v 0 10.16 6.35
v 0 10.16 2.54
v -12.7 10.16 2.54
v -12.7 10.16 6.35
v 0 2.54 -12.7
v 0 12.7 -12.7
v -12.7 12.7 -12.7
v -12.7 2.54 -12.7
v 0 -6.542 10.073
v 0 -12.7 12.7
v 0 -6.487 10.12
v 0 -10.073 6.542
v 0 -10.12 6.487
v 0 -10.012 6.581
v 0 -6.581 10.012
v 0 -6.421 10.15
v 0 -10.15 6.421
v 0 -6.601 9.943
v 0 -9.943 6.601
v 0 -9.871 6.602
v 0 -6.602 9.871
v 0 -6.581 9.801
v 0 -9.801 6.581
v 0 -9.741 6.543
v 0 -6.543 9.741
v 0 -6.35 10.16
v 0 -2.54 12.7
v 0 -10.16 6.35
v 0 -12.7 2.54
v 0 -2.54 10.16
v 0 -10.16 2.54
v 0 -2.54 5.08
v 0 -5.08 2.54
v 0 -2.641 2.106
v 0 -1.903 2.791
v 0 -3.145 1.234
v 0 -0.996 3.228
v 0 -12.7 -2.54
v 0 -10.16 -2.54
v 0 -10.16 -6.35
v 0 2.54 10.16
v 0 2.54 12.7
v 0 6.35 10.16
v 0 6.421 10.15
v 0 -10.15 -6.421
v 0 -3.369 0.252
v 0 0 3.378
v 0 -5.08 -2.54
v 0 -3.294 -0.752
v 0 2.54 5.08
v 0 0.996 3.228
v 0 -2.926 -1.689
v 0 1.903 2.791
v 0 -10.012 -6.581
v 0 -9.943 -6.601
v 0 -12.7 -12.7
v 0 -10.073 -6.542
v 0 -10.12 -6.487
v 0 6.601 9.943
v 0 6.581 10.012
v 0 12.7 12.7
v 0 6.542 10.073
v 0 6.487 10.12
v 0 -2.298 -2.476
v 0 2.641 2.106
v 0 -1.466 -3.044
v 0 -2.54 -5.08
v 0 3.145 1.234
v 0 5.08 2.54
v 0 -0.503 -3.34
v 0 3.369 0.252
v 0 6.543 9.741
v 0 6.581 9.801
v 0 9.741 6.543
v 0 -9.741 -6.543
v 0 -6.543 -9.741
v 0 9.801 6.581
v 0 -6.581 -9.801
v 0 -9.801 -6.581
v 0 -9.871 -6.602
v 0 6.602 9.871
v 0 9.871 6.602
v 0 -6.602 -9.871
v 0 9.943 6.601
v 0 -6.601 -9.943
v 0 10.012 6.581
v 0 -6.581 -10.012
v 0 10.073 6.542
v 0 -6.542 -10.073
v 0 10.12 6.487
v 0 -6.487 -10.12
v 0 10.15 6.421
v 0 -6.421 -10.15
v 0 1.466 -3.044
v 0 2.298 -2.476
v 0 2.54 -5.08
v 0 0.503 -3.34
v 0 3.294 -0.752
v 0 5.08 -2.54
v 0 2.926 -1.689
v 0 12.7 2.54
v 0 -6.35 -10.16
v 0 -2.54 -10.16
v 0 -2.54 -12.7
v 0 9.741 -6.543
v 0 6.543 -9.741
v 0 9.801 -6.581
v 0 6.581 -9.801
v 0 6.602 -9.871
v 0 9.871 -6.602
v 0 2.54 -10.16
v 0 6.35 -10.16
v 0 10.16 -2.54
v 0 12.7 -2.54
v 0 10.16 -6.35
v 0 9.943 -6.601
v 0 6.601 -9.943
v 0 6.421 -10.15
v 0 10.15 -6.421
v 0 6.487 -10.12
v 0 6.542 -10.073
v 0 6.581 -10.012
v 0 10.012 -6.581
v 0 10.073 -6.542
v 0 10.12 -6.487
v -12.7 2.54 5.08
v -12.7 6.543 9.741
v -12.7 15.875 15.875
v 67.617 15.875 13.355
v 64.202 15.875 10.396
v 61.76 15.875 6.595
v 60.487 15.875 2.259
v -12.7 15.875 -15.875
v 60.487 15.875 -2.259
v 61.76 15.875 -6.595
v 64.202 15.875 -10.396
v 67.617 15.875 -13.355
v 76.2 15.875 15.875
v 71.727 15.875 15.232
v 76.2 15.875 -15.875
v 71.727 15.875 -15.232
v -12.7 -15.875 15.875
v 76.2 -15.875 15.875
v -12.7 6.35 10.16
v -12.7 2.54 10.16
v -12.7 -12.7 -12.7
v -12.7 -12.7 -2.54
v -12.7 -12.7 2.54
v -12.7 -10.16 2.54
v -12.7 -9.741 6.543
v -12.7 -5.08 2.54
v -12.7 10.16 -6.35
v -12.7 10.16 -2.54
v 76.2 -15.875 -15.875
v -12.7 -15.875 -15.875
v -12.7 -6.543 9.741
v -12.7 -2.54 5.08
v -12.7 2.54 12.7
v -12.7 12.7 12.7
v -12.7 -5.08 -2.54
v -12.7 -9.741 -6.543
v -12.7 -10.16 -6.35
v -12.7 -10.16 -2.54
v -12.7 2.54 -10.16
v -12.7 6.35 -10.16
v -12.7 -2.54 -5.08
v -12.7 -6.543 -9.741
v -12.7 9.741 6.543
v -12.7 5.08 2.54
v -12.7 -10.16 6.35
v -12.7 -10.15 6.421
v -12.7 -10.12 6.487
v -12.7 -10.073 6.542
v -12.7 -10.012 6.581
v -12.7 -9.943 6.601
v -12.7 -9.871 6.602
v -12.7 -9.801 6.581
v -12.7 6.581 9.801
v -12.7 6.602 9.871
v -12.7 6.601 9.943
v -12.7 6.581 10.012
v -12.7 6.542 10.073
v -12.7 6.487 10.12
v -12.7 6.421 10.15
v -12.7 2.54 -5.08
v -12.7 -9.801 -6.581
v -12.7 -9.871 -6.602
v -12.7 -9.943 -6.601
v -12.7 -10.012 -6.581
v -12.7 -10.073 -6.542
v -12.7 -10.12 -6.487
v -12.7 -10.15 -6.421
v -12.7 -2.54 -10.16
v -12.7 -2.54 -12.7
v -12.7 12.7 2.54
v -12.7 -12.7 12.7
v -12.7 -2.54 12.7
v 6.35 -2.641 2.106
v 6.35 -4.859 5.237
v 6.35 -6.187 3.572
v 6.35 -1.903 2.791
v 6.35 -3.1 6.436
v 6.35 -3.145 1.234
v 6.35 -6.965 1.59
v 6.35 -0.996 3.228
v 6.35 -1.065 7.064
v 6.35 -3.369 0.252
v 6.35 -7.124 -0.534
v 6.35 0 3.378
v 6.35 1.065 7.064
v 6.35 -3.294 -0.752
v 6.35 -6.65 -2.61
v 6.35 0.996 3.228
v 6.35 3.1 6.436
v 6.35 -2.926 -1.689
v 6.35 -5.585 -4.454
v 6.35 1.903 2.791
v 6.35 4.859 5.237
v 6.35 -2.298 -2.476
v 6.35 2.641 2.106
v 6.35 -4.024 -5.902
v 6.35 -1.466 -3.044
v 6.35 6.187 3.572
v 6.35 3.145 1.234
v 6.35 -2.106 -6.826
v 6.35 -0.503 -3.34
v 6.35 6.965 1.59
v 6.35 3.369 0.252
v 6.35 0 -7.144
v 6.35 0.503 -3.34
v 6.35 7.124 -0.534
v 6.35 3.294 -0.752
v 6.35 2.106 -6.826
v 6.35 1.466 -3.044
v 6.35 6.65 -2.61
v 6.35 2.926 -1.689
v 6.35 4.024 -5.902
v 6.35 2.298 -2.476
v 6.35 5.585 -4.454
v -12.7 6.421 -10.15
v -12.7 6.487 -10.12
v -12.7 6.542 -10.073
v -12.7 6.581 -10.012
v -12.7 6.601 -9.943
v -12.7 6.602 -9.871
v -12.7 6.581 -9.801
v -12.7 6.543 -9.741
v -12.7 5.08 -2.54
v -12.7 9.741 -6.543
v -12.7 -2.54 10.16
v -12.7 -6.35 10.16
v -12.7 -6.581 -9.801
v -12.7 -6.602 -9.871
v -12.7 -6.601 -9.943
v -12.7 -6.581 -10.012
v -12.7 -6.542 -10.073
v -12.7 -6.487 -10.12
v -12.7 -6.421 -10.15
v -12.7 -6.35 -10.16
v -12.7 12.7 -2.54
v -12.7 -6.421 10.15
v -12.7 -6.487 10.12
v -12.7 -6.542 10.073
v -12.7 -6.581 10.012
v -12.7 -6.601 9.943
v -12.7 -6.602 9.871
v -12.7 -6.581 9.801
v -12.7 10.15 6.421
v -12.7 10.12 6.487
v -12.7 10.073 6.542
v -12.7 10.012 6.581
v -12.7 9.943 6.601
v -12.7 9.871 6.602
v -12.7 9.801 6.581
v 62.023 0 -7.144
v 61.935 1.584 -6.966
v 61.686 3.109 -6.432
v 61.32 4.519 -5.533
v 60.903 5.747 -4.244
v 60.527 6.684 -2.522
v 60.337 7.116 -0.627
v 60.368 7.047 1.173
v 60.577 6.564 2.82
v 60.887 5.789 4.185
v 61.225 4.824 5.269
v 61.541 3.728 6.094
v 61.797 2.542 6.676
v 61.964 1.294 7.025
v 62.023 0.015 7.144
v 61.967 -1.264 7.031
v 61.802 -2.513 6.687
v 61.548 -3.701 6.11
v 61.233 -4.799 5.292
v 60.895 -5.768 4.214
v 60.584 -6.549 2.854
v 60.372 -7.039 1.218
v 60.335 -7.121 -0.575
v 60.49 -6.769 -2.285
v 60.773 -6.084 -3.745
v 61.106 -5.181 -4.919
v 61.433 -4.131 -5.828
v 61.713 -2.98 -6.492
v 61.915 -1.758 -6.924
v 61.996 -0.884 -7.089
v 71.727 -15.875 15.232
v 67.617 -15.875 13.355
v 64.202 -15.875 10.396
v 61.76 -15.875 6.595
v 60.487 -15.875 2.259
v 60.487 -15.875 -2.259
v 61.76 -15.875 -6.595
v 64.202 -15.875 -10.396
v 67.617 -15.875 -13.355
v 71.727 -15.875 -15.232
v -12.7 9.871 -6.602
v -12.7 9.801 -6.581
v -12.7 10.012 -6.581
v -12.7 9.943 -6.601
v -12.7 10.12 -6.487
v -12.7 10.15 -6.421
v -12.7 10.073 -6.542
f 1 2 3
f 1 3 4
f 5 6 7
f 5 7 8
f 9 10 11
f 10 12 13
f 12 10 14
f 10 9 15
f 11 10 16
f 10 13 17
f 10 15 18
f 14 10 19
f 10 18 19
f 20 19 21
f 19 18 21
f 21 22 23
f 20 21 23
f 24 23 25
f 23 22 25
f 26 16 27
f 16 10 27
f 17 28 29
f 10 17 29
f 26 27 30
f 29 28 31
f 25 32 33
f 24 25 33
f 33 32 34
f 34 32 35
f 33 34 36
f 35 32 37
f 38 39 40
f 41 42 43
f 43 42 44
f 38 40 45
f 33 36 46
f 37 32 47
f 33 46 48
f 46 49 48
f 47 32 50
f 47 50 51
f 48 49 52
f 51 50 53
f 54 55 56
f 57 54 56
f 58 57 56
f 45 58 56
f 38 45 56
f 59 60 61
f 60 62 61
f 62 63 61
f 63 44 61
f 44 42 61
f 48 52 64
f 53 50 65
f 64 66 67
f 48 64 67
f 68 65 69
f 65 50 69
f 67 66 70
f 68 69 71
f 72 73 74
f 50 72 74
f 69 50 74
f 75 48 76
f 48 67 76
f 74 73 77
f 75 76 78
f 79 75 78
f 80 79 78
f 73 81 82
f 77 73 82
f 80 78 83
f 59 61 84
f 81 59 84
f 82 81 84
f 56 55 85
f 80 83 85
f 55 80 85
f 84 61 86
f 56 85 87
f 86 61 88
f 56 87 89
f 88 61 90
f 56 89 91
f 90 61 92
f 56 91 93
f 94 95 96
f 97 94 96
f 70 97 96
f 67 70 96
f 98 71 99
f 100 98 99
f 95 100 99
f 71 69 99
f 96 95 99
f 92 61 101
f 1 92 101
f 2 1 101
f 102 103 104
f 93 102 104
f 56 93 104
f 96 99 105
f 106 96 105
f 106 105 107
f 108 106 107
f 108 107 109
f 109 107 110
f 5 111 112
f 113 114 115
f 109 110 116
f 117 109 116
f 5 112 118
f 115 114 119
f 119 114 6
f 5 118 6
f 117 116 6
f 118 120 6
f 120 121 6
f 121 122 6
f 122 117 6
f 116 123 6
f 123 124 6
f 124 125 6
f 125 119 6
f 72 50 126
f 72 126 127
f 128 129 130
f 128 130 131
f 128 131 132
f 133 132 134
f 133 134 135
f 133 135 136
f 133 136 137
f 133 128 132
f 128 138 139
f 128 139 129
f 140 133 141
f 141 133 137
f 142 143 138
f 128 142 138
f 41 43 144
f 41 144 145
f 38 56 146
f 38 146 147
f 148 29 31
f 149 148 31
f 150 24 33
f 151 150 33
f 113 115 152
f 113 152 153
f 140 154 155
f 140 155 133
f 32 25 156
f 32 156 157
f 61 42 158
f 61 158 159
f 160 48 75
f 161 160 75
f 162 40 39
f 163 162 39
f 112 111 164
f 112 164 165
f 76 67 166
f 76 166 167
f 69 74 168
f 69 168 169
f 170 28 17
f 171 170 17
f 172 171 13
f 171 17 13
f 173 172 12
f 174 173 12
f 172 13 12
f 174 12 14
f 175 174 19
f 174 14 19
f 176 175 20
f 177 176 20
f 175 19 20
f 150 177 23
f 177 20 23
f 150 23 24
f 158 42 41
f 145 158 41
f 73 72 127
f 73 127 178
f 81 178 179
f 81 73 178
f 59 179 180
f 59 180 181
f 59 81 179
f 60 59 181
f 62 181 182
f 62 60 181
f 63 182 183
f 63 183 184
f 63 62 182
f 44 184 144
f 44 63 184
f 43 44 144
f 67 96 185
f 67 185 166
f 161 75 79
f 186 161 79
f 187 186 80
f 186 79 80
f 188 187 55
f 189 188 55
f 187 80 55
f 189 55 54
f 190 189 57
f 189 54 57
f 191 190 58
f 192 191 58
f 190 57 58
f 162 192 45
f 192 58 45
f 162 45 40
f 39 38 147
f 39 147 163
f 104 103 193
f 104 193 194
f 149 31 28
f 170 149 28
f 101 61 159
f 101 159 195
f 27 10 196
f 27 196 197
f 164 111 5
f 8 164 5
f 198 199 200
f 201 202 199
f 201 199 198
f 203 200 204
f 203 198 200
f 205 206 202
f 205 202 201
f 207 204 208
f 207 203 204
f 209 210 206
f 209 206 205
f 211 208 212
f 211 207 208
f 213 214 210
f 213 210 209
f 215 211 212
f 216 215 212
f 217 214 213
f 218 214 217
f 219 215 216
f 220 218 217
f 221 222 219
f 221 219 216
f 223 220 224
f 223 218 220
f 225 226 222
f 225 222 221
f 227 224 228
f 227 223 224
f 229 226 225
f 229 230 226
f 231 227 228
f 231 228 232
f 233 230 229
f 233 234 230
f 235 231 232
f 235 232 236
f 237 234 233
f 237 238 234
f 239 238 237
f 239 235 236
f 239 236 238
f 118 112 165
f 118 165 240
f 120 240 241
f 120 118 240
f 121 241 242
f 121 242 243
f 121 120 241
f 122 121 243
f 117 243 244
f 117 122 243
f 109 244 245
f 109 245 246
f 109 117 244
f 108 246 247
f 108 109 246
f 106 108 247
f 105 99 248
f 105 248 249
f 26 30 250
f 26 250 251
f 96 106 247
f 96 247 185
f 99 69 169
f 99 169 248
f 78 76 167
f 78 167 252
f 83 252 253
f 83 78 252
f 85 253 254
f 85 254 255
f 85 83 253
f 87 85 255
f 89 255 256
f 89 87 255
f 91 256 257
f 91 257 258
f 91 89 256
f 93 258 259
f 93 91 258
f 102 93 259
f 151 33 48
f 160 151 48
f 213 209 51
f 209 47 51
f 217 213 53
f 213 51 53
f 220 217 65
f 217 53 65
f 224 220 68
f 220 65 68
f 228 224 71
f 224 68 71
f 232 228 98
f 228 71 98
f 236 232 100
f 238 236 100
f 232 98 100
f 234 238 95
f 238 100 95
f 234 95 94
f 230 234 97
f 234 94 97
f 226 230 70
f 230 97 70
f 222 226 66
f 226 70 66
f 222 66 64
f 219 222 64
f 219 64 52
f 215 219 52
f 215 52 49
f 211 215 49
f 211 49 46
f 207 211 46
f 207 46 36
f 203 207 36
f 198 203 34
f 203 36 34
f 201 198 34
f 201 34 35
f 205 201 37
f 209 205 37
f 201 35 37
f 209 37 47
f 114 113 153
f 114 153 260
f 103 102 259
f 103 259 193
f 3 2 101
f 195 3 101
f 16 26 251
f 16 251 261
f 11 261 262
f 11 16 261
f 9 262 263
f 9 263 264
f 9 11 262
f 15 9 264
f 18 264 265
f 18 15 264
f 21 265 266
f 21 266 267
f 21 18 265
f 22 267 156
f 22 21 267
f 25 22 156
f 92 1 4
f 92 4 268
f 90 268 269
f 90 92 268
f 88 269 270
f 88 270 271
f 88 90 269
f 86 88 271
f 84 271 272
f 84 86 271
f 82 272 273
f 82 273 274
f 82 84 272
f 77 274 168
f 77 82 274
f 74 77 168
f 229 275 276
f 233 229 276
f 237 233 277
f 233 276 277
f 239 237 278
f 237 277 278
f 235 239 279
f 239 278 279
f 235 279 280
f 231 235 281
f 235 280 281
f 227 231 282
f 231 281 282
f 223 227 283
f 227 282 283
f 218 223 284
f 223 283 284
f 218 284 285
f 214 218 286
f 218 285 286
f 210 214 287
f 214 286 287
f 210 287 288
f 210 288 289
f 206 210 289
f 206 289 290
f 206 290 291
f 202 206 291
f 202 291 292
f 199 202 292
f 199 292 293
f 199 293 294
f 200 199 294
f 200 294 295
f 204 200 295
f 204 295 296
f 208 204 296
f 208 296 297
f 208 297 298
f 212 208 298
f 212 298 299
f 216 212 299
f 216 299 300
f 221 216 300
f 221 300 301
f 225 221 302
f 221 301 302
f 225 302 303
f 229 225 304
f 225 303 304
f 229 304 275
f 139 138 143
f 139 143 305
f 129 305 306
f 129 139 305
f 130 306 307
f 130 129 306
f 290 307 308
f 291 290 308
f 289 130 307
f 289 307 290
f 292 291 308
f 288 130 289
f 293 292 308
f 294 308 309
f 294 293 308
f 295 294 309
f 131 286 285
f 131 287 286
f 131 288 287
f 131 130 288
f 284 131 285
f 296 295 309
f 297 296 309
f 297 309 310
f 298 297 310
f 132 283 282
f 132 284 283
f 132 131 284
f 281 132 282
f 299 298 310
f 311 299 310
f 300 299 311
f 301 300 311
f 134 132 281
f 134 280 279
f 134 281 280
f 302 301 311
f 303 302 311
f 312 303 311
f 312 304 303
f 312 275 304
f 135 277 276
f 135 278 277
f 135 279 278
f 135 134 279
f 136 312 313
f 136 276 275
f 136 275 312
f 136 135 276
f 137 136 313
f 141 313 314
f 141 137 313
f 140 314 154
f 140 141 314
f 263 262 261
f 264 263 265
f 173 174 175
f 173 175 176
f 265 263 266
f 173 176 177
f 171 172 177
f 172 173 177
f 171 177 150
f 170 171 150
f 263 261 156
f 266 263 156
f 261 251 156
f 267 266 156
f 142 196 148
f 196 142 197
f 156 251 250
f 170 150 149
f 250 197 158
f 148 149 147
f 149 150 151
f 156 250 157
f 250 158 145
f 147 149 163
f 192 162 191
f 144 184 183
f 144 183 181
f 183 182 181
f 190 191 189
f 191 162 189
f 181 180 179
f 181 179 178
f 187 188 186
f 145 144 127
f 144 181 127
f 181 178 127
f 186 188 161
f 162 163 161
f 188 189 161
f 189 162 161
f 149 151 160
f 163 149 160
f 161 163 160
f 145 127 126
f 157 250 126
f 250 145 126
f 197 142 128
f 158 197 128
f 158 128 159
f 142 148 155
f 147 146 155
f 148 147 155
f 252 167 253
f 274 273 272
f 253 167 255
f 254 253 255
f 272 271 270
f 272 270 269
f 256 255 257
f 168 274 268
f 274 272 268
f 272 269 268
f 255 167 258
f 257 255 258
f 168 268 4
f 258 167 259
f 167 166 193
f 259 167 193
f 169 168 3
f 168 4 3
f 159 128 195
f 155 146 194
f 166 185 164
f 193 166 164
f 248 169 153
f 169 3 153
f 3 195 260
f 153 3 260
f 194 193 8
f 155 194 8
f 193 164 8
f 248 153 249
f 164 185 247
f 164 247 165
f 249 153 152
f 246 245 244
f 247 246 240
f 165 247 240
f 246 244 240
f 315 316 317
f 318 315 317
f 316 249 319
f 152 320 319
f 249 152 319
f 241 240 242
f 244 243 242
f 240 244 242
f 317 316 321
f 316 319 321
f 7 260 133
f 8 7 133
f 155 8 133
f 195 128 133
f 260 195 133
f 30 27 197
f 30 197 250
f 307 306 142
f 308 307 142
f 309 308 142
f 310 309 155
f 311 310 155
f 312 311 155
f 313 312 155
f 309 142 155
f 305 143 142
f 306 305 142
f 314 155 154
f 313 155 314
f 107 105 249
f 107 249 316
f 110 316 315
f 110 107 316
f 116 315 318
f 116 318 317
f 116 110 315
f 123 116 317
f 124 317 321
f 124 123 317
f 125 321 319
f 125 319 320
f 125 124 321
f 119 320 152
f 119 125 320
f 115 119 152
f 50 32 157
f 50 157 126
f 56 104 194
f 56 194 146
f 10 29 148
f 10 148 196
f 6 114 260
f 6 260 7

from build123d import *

# Parameters (mm, degrees)
SKETCH10_W                                           = 31.75
SKETCH10_H                                           = 31.75
SKETCH10_W_2                                         = 2.54
SKETCH10_H_2                                         = 5.08
SKETCH10_W_3                                         = 5.08
SKETCH10_H_3                                         = 2.54
BOSS_EXTRUDE3_DEPTH                                  = 12.7
SKETCH11_W                                           = 31.75
SKETCH11_H                                           = 31.75
BOSS_EXTRUDE4_DEPTH                                  = 76.2
CBORE_FOR_1_4_BINDING_HEAD_MACHINE_SCREW_D           = 6.7564
CBORE_FOR_1_4_BINDING_HEAD_MACHINE_SCREW_CBORE_D     = 14.2875
CBORE_FOR_1_4_BINDING_HEAD_MACHINE_SCREW_CBORE_DEPTH = 69.85
CUT_EXTRUDE1_DEPTH                                   = 31.75


with BuildPart() as part:
    # Sketch10 → Boss-Extrude3 (new body)
    # profile 1 of 9: a face of its own
    with BuildSketch(Plane(origin=(0, 0, 0), x_dir=(0, 0, -1), z_dir=(1, 0, 0))):
        Rectangle(SKETCH10_W, SKETCH10_H)
        Polygon((-2.54, 12.7), (2.54, 12.7), (12.7, 12.7), (12.7, 2.54), (12.7, -2.54), (12.7, -12.7), (2.54, -12.7), (-2.54, -12.7), (-12.7, -12.7), (-12.7, -2.54), (-12.7, 2.54), (-12.7, 12.7), align=None, mode=Mode.SUBTRACT)
    # profile 2 of 9: a face of its own
    with BuildSketch(Plane(origin=(0, 0, 0), x_dir=(0, 0, -1), z_dir=(1, 0, 0))):
        with Locations((11.43, 0)):
            Rectangle(SKETCH10_W_2, SKETCH10_H_2)
    # profile 3 of 9: a face of its own
    with BuildSketch(Plane(origin=(0, 0, 0), x_dir=(0, 0, -1), z_dir=(1, 0, 0))):
        with BuildLine():
            Line((10.16, -2.54), (10.16, 2.54))
            Line((10.16, 2.54), (10.16, 6.35))
            ThreePointArc((10.16, 6.35), (10.012022021, 6.580814495), (9.740509205, 6.542688341))
            Line((9.740509205, 6.542688341), (5.08, 2.54))
            Line((5.08, 2.54), (5.08, -2.54))
            Line((5.08, -2.54), (9.740509205, -6.542688341))
            ThreePointArc((9.740509205, -6.542688341), (10.012022021, -6.580814495), (10.16, -6.35))
            Line((10.16, -6.35), (10.16, -2.54))
        make_face()
    # profile 4 of 9: a face of its own
    with BuildSketch(Plane(origin=(0, 0, 0), x_dir=(0, 0, -1), z_dir=(1, 0, 0))):
        with Locations((0, -11.43)):
            Rectangle(SKETCH10_W_3, SKETCH10_H_3)
    # profile 5 of 9: a face of its own
    with BuildSketch(Plane(origin=(0, 0, 0), x_dir=(0, 0, -1), z_dir=(1, 0, 0))):
        with BuildLine():
            ThreePointArc((6.542688341, -9.740509205), (6.580814495, -10.012022021), (6.35, -10.16))
            Line((6.35, -10.16), (-6.35, -10.16))
            ThreePointArc((-6.35, -10.16), (-6.580814495, -10.012022021), (-6.542688341, -9.740509205))
            Line((-6.542688341, -9.740509205), (-2.54, -5.08))
            Line((-2.54, -5.08), (2.54, -5.08))
            Line((2.54, -5.08), (6.542688341, -9.740509205))
        make_face()
    # profile 6 of 9: a face of its own
    with BuildSketch(Plane(origin=(0, 0, 0), x_dir=(0, 0, -1), z_dir=(1, 0, 0))):
        with Locations((0, 11.43)):
            Rectangle(SKETCH10_W_3, SKETCH10_H_3)
    # profile 7 of 9: a face of its own
    with BuildSketch(Plane(origin=(0, 0, 0), x_dir=(0, 0, -1), z_dir=(1, 0, 0))):
        with BuildLine():
            Line((6.35, 10.16), (-6.35, 10.16))
            ThreePointArc((-6.35, 10.16), (-6.580814495, 10.012022021), (-6.542688341, 9.740509205))
            Line((-6.542688341, 9.740509205), (-2.54, 5.08))
            Line((-2.54, 5.08), (2.54, 5.08))
            Line((2.54, 5.08), (6.542688341, 9.740509205))
            ThreePointArc((6.542688341, 9.740509205), (6.580814495, 10.012022021), (6.35, 10.16))
        make_face()
    # profile 8 of 9: a face of its own
    with BuildSketch(Plane(origin=(0, 0, 0), x_dir=(0, 0, -1), z_dir=(1, 0, 0))):
        with BuildLine():
            Line((-5.08, 2.54), (-9.740509205, 6.542688341))
            ThreePointArc((-9.740509205, 6.542688341), (-10.012022021, 6.580814495), (-10.16, 6.35))
            Line((-10.16, 6.35), (-10.16, -6.35))
            ThreePointArc((-10.16, -6.35), (-10.012022021, -6.580814495), (-9.740509205, -6.542688341))
            Line((-9.740509205, -6.542688341), (-5.08, -2.54))
            Line((-5.08, -2.54), (-5.08, 2.54))
        make_face()
    # profile 9 of 9: a face of its own
    with BuildSketch(Plane(origin=(0, 0, 0), x_dir=(0, 0, -1), z_dir=(1, 0, 0))):
        with Locations((-11.43, 0)):
            Rectangle(SKETCH10_W_2, SKETCH10_H_2)
    extrude(amount=-BOSS_EXTRUDE3_DEPTH)

    # Sketch11 → Boss-Extrude4 (add)
    with BuildSketch(Plane(origin=(0, 0, 0), x_dir=(0, 0, -1), z_dir=(1, 0, 0))):
        Rectangle(SKETCH11_W, SKETCH11_H)
    extrude(amount=BOSS_EXTRUDE4_DEPTH)

    # CBORE for 1/4 Binding Head Machine Screw1 (through all)
    with Locations(Plane(origin=(76.2, 0, 0), x_dir=(0, 0, -1), z_dir=(1, 0, 0))):
        with Locations((0, 0)):
            CounterBoreHole(CBORE_FOR_1_4_BINDING_HEAD_MACHINE_SCREW_D / 2, CBORE_FOR_1_4_BINDING_HEAD_MACHINE_SCREW_CBORE_D / 2, CBORE_FOR_1_4_BINDING_HEAD_MACHINE_SCREW_CBORE_DEPTH)

    # Sketch15 → Cut-Extrude1 (cut)
    with BuildSketch(Plane(origin=(0, 15.875, 0), x_dir=(1, 0, 0), z_dir=(0, 1, 0))):
        with BuildLine():
            Line((76.2, 15.875), (76.2, -15.875))
            ThreePointArc((76.2, -15.875), (60.325, 0), (76.2, 15.875))
        make_face()
    extrude(amount=-CUT_EXTRUDE1_DEPTH, mode=Mode.SUBTRACT)


solid = part.part
